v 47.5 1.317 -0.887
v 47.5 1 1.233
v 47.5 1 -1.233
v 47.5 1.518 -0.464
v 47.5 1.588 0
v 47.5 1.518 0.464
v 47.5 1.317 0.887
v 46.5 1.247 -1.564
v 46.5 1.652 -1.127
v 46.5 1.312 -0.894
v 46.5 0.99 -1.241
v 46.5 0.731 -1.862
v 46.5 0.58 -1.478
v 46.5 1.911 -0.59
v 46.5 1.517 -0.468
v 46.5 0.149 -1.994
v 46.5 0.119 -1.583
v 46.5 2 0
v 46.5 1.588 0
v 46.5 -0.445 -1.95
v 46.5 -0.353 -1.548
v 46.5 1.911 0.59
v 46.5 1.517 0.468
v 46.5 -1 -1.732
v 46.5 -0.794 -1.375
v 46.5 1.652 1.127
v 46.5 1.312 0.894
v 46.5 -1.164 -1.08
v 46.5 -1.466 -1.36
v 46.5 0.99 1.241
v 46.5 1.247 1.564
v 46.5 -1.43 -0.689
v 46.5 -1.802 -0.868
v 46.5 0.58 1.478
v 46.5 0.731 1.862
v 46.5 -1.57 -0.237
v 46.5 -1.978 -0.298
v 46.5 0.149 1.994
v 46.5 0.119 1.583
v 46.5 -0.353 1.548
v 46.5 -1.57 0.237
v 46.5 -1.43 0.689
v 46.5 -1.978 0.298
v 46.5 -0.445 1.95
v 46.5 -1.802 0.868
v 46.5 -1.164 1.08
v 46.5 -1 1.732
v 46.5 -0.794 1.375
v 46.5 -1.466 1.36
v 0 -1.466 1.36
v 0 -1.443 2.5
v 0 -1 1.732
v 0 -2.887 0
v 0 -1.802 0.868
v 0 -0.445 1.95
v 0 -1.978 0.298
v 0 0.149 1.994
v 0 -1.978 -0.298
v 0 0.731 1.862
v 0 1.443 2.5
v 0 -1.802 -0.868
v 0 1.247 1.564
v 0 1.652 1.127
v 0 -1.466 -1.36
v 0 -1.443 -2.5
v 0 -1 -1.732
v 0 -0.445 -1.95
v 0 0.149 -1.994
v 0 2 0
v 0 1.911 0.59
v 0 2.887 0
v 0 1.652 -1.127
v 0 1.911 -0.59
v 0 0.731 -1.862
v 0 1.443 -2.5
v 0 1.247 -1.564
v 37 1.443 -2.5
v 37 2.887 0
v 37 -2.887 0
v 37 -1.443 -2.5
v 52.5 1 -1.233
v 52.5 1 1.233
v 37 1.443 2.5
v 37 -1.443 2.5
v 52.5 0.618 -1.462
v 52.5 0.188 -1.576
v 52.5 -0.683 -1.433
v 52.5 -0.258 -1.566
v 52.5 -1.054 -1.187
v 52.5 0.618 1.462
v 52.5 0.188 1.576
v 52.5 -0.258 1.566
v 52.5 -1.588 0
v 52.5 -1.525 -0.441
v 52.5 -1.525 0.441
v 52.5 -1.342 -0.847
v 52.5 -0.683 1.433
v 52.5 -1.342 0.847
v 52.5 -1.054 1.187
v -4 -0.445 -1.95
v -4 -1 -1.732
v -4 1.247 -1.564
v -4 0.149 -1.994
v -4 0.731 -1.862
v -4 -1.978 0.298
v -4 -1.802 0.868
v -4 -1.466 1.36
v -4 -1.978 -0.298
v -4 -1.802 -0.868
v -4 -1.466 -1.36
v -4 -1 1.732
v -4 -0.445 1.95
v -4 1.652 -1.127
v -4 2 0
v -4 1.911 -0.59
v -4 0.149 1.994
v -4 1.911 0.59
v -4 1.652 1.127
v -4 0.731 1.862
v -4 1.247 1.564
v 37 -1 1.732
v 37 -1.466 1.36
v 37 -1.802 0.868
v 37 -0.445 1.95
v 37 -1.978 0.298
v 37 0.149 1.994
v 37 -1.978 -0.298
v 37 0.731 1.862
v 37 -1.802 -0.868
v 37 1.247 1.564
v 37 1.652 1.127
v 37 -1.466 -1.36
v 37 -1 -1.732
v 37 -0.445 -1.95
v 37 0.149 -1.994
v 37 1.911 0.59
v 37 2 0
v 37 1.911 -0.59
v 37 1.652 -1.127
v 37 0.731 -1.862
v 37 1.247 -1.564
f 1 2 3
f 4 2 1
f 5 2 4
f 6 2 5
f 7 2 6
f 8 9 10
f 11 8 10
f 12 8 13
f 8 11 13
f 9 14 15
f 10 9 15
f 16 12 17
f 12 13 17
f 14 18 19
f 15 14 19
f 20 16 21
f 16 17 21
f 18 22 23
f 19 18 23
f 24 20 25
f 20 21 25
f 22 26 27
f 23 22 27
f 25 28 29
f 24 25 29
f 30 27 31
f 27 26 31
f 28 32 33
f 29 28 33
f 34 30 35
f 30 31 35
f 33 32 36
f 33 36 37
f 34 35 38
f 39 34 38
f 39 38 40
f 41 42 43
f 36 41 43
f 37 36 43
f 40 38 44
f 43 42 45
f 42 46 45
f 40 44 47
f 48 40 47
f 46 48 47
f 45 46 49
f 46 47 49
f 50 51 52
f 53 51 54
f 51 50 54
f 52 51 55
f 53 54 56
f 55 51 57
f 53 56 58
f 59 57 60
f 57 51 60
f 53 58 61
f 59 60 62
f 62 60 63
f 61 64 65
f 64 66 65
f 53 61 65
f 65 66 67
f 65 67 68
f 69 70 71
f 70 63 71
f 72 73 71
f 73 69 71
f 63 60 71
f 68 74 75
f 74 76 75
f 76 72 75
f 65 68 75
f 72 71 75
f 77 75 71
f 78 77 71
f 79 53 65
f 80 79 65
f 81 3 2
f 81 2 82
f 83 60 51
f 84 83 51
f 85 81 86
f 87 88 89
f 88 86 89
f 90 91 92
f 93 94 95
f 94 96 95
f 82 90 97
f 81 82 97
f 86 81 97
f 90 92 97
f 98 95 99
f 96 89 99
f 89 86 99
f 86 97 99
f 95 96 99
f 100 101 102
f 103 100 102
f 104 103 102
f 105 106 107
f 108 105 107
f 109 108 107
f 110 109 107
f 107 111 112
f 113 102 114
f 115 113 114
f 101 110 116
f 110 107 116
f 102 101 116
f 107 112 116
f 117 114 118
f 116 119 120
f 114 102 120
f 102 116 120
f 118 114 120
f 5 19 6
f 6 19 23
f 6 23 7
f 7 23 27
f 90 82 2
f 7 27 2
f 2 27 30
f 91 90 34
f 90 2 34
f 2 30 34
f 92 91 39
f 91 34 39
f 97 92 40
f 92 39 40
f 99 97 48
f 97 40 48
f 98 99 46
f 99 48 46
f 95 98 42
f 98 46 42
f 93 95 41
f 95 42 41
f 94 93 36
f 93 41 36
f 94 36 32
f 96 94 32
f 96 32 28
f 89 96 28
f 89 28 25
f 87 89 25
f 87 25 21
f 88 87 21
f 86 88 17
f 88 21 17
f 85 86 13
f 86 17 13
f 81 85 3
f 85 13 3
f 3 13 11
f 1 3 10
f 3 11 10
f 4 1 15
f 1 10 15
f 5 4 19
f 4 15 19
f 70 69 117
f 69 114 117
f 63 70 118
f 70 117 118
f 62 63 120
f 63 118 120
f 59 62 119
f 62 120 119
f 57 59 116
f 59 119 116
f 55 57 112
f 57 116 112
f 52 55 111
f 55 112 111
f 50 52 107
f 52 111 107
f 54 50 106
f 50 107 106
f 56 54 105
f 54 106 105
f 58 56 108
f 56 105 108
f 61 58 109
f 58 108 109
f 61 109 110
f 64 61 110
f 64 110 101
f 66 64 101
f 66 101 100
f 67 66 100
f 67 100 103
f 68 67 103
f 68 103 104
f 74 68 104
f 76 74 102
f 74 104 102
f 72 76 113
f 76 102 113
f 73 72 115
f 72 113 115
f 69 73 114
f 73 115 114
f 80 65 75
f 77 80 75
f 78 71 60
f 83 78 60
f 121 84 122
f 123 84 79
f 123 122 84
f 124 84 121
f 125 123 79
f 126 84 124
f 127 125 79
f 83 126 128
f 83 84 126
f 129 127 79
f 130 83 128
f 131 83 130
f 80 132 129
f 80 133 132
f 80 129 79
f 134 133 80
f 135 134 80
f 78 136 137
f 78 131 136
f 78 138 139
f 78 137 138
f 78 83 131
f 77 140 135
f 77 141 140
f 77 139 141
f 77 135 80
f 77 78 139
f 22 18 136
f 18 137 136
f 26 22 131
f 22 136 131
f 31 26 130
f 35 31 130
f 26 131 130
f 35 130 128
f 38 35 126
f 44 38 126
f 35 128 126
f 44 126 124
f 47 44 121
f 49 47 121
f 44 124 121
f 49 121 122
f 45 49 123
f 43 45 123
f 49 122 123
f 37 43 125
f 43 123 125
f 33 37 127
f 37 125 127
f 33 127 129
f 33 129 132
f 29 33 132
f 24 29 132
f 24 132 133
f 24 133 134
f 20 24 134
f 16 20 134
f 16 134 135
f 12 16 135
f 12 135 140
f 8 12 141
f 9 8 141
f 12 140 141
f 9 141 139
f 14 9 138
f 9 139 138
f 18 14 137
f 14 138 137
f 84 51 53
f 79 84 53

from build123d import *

# Parameters (mm, degrees)
BOSS_EXTRUDE1_DEPTH = 37
SKETCH4_W           = 8.655670696
SKETCH4_H           = 10.70324871
CUT_EXTRUDE1_DEPTH  = 2.886751346


with BuildPart() as part:
    # Sketch1 → Revolve1 (revolve)
    with BuildSketch(Plane.XY):
        Polygon((0, 2), (-4, 2), (-4, 0), (52.5, 0), (52.5, 1.5875), (46.5, 1.5875), (46.5, 2), (37, 2), (37, 2.5), (0, 2.5), align=None)
    revolve(axis=Axis((-6.185185185, 0, 0), (1, 0, 0)))

    # Sketch2 → Boss-Extrude1 (add)
    with BuildSketch(Plane(origin=(0, 0, 0), x_dir=(0, 0, -1), z_dir=(1, 0, 0))):
        Polygon((0, 2.886751346), (-2.5, 1.443375673), (-2.5, -1.443375673), (0, -2.886751346), (2.5, -1.443375673), (2.5, 1.443375673), align=None)
    extrude(amount=BOSS_EXTRUDE1_DEPTH)

    # Sketch4 → Cut-Extrude1 (cut, through all)
    with BuildSketch(Plane(origin=(0, 1, 0), x_dir=(1, 0, 0), z_dir=(0, 1, 0))):
        with Locations((51.827835348, -0.030836047)):
            Rectangle(SKETCH4_W, SKETCH4_H)
    extrude(amount=CUT_EXTRUDE1_DEPTH, mode=Mode.SUBTRACT)


solid = part.part
